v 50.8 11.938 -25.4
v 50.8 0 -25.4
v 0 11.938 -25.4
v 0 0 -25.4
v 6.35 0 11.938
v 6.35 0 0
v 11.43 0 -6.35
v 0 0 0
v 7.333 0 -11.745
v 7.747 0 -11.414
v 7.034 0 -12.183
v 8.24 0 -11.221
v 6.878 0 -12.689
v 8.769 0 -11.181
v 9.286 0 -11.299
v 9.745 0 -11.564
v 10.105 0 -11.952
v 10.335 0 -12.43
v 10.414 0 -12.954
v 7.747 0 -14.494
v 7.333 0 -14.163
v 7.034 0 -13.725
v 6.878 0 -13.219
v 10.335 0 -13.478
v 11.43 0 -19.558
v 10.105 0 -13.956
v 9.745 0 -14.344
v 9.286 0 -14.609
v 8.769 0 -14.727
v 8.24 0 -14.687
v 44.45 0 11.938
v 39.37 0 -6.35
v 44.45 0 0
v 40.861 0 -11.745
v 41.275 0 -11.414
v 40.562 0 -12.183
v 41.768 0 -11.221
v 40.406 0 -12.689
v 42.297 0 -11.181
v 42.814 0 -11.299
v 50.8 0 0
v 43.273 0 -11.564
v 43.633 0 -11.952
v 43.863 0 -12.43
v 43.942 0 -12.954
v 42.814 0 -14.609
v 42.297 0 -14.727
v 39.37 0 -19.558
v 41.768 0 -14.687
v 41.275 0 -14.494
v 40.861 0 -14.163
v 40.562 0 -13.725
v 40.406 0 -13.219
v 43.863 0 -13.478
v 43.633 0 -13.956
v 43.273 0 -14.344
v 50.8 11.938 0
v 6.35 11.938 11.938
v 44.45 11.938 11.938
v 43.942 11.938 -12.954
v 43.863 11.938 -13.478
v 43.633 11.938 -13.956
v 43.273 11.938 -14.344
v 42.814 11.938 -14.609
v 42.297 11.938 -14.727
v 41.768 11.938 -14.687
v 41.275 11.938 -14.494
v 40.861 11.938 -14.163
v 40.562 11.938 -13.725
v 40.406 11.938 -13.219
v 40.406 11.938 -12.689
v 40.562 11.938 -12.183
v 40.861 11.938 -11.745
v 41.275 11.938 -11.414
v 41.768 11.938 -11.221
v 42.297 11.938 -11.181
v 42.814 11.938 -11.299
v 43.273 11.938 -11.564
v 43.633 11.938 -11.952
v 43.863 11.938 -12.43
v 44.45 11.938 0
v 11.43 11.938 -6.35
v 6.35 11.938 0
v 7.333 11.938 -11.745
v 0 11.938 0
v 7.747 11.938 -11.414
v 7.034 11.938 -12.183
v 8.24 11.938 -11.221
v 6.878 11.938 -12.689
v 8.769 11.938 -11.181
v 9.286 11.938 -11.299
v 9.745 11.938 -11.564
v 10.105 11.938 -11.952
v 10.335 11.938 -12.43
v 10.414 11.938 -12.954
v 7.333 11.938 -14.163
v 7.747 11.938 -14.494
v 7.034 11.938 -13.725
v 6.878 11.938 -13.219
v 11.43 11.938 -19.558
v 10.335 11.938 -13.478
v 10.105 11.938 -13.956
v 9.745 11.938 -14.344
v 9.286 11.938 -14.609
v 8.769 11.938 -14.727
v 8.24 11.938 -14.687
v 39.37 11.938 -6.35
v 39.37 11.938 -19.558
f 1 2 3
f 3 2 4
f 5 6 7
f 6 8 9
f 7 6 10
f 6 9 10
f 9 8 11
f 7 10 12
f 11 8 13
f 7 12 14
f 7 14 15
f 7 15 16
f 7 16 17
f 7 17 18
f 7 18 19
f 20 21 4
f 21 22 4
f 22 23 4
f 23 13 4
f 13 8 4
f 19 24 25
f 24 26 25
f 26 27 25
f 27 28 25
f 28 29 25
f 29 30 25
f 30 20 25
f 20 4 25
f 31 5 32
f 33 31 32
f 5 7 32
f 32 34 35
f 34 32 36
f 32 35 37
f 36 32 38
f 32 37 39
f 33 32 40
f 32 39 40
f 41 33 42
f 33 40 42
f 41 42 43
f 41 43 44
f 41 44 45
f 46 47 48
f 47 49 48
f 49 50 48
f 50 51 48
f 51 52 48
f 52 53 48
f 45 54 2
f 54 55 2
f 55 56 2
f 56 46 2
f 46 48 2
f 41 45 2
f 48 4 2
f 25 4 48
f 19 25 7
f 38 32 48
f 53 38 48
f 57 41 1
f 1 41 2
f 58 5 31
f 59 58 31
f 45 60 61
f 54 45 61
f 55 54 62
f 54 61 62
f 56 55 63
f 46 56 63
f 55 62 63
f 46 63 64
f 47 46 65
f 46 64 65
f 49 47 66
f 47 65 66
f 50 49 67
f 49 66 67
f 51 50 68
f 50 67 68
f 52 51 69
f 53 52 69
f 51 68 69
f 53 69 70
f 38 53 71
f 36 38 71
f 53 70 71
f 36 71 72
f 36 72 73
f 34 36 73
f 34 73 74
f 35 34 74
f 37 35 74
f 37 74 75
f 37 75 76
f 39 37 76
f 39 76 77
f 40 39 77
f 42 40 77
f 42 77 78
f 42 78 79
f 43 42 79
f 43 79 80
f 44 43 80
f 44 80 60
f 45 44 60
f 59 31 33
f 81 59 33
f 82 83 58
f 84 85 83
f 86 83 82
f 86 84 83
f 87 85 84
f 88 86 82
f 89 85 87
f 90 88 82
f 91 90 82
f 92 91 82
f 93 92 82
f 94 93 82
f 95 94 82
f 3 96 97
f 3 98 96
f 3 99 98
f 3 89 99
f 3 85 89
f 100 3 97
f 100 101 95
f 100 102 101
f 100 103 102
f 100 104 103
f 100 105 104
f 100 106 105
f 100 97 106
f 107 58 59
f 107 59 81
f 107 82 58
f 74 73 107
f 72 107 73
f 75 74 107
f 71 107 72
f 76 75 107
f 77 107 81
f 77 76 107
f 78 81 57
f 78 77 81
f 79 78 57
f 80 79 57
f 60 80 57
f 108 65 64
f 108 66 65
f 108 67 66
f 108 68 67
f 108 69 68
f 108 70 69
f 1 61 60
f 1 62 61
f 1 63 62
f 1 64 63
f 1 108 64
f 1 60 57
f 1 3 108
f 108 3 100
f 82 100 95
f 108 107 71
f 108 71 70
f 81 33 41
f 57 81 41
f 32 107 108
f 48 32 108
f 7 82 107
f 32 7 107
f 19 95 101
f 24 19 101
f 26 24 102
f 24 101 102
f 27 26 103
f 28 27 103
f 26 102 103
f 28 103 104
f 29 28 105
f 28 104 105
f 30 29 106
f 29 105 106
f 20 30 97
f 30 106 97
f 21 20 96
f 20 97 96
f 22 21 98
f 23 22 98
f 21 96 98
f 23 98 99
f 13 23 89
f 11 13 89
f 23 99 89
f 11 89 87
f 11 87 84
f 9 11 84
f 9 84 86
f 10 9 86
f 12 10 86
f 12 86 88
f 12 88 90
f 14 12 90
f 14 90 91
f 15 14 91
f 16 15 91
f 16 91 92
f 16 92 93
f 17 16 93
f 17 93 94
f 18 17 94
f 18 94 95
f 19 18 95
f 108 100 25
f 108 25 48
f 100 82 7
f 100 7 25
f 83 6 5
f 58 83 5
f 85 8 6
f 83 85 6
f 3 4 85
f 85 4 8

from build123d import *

# Parameters (mm, degrees)
TILT_MOUNT_DEPTH              = 11.938
SERVO_HOLE_SKETCH_W           = 27.94
SERVO_HOLE_SKETCH_H           = 13.208
SERVO_HOLE_DEPTH              = 12.938
MOUNTING_HOLES_GUIDE_SKETCH_R = 1.778
MOUNTING_HOLES_DEPTH          = 12.938


with BuildPart() as part:
    # Tilt Mount Sketch → Tilt Mount (new body)
    with BuildSketch(Plane(origin=(0, 0, 0), x_dir=(1, 0, 0), z_dir=(0, 1, 0))):
        Polygon((44.45, 0), (50.8, 0), (50.8, 25.4), (0, 25.4), (0, 0), (6.35, 0), (6.35, -11.938), (44.45, -11.938), align=None)
    extrude(amount=TILT_MOUNT_DEPTH)

    # Servo Hole Sketch → Servo Hole (cut, through all)
    with BuildSketch(Plane(origin=(0, 11.938, 0), x_dir=(1, 0, 0), z_dir=(0, 1, 0))):
        with Locations((25.4, 12.954)):
            Rectangle(SERVO_HOLE_SKETCH_W, SERVO_HOLE_SKETCH_H)
    extrude(amount=-SERVO_HOLE_DEPTH, mode=Mode.SUBTRACT)

    # Mounting Holes Guide Sketch → Mounting Holes (cut, through all)
    with BuildSketch(Plane(origin=(0, 11.938, 0), x_dir=(1, 0, 0), z_dir=(0, 1, 0))):
        with Locations((8.636, 12.954)):
            Circle(MOUNTING_HOLES_GUIDE_SKETCH_R)
        with Locations((42.164, 12.954)):
            Circle(MOUNTING_HOLES_GUIDE_SKETCH_R)
    extrude(amount=-MOUNTING_HOLES_DEPTH, mode=Mode.SUBTRACT)


solid = part.part
